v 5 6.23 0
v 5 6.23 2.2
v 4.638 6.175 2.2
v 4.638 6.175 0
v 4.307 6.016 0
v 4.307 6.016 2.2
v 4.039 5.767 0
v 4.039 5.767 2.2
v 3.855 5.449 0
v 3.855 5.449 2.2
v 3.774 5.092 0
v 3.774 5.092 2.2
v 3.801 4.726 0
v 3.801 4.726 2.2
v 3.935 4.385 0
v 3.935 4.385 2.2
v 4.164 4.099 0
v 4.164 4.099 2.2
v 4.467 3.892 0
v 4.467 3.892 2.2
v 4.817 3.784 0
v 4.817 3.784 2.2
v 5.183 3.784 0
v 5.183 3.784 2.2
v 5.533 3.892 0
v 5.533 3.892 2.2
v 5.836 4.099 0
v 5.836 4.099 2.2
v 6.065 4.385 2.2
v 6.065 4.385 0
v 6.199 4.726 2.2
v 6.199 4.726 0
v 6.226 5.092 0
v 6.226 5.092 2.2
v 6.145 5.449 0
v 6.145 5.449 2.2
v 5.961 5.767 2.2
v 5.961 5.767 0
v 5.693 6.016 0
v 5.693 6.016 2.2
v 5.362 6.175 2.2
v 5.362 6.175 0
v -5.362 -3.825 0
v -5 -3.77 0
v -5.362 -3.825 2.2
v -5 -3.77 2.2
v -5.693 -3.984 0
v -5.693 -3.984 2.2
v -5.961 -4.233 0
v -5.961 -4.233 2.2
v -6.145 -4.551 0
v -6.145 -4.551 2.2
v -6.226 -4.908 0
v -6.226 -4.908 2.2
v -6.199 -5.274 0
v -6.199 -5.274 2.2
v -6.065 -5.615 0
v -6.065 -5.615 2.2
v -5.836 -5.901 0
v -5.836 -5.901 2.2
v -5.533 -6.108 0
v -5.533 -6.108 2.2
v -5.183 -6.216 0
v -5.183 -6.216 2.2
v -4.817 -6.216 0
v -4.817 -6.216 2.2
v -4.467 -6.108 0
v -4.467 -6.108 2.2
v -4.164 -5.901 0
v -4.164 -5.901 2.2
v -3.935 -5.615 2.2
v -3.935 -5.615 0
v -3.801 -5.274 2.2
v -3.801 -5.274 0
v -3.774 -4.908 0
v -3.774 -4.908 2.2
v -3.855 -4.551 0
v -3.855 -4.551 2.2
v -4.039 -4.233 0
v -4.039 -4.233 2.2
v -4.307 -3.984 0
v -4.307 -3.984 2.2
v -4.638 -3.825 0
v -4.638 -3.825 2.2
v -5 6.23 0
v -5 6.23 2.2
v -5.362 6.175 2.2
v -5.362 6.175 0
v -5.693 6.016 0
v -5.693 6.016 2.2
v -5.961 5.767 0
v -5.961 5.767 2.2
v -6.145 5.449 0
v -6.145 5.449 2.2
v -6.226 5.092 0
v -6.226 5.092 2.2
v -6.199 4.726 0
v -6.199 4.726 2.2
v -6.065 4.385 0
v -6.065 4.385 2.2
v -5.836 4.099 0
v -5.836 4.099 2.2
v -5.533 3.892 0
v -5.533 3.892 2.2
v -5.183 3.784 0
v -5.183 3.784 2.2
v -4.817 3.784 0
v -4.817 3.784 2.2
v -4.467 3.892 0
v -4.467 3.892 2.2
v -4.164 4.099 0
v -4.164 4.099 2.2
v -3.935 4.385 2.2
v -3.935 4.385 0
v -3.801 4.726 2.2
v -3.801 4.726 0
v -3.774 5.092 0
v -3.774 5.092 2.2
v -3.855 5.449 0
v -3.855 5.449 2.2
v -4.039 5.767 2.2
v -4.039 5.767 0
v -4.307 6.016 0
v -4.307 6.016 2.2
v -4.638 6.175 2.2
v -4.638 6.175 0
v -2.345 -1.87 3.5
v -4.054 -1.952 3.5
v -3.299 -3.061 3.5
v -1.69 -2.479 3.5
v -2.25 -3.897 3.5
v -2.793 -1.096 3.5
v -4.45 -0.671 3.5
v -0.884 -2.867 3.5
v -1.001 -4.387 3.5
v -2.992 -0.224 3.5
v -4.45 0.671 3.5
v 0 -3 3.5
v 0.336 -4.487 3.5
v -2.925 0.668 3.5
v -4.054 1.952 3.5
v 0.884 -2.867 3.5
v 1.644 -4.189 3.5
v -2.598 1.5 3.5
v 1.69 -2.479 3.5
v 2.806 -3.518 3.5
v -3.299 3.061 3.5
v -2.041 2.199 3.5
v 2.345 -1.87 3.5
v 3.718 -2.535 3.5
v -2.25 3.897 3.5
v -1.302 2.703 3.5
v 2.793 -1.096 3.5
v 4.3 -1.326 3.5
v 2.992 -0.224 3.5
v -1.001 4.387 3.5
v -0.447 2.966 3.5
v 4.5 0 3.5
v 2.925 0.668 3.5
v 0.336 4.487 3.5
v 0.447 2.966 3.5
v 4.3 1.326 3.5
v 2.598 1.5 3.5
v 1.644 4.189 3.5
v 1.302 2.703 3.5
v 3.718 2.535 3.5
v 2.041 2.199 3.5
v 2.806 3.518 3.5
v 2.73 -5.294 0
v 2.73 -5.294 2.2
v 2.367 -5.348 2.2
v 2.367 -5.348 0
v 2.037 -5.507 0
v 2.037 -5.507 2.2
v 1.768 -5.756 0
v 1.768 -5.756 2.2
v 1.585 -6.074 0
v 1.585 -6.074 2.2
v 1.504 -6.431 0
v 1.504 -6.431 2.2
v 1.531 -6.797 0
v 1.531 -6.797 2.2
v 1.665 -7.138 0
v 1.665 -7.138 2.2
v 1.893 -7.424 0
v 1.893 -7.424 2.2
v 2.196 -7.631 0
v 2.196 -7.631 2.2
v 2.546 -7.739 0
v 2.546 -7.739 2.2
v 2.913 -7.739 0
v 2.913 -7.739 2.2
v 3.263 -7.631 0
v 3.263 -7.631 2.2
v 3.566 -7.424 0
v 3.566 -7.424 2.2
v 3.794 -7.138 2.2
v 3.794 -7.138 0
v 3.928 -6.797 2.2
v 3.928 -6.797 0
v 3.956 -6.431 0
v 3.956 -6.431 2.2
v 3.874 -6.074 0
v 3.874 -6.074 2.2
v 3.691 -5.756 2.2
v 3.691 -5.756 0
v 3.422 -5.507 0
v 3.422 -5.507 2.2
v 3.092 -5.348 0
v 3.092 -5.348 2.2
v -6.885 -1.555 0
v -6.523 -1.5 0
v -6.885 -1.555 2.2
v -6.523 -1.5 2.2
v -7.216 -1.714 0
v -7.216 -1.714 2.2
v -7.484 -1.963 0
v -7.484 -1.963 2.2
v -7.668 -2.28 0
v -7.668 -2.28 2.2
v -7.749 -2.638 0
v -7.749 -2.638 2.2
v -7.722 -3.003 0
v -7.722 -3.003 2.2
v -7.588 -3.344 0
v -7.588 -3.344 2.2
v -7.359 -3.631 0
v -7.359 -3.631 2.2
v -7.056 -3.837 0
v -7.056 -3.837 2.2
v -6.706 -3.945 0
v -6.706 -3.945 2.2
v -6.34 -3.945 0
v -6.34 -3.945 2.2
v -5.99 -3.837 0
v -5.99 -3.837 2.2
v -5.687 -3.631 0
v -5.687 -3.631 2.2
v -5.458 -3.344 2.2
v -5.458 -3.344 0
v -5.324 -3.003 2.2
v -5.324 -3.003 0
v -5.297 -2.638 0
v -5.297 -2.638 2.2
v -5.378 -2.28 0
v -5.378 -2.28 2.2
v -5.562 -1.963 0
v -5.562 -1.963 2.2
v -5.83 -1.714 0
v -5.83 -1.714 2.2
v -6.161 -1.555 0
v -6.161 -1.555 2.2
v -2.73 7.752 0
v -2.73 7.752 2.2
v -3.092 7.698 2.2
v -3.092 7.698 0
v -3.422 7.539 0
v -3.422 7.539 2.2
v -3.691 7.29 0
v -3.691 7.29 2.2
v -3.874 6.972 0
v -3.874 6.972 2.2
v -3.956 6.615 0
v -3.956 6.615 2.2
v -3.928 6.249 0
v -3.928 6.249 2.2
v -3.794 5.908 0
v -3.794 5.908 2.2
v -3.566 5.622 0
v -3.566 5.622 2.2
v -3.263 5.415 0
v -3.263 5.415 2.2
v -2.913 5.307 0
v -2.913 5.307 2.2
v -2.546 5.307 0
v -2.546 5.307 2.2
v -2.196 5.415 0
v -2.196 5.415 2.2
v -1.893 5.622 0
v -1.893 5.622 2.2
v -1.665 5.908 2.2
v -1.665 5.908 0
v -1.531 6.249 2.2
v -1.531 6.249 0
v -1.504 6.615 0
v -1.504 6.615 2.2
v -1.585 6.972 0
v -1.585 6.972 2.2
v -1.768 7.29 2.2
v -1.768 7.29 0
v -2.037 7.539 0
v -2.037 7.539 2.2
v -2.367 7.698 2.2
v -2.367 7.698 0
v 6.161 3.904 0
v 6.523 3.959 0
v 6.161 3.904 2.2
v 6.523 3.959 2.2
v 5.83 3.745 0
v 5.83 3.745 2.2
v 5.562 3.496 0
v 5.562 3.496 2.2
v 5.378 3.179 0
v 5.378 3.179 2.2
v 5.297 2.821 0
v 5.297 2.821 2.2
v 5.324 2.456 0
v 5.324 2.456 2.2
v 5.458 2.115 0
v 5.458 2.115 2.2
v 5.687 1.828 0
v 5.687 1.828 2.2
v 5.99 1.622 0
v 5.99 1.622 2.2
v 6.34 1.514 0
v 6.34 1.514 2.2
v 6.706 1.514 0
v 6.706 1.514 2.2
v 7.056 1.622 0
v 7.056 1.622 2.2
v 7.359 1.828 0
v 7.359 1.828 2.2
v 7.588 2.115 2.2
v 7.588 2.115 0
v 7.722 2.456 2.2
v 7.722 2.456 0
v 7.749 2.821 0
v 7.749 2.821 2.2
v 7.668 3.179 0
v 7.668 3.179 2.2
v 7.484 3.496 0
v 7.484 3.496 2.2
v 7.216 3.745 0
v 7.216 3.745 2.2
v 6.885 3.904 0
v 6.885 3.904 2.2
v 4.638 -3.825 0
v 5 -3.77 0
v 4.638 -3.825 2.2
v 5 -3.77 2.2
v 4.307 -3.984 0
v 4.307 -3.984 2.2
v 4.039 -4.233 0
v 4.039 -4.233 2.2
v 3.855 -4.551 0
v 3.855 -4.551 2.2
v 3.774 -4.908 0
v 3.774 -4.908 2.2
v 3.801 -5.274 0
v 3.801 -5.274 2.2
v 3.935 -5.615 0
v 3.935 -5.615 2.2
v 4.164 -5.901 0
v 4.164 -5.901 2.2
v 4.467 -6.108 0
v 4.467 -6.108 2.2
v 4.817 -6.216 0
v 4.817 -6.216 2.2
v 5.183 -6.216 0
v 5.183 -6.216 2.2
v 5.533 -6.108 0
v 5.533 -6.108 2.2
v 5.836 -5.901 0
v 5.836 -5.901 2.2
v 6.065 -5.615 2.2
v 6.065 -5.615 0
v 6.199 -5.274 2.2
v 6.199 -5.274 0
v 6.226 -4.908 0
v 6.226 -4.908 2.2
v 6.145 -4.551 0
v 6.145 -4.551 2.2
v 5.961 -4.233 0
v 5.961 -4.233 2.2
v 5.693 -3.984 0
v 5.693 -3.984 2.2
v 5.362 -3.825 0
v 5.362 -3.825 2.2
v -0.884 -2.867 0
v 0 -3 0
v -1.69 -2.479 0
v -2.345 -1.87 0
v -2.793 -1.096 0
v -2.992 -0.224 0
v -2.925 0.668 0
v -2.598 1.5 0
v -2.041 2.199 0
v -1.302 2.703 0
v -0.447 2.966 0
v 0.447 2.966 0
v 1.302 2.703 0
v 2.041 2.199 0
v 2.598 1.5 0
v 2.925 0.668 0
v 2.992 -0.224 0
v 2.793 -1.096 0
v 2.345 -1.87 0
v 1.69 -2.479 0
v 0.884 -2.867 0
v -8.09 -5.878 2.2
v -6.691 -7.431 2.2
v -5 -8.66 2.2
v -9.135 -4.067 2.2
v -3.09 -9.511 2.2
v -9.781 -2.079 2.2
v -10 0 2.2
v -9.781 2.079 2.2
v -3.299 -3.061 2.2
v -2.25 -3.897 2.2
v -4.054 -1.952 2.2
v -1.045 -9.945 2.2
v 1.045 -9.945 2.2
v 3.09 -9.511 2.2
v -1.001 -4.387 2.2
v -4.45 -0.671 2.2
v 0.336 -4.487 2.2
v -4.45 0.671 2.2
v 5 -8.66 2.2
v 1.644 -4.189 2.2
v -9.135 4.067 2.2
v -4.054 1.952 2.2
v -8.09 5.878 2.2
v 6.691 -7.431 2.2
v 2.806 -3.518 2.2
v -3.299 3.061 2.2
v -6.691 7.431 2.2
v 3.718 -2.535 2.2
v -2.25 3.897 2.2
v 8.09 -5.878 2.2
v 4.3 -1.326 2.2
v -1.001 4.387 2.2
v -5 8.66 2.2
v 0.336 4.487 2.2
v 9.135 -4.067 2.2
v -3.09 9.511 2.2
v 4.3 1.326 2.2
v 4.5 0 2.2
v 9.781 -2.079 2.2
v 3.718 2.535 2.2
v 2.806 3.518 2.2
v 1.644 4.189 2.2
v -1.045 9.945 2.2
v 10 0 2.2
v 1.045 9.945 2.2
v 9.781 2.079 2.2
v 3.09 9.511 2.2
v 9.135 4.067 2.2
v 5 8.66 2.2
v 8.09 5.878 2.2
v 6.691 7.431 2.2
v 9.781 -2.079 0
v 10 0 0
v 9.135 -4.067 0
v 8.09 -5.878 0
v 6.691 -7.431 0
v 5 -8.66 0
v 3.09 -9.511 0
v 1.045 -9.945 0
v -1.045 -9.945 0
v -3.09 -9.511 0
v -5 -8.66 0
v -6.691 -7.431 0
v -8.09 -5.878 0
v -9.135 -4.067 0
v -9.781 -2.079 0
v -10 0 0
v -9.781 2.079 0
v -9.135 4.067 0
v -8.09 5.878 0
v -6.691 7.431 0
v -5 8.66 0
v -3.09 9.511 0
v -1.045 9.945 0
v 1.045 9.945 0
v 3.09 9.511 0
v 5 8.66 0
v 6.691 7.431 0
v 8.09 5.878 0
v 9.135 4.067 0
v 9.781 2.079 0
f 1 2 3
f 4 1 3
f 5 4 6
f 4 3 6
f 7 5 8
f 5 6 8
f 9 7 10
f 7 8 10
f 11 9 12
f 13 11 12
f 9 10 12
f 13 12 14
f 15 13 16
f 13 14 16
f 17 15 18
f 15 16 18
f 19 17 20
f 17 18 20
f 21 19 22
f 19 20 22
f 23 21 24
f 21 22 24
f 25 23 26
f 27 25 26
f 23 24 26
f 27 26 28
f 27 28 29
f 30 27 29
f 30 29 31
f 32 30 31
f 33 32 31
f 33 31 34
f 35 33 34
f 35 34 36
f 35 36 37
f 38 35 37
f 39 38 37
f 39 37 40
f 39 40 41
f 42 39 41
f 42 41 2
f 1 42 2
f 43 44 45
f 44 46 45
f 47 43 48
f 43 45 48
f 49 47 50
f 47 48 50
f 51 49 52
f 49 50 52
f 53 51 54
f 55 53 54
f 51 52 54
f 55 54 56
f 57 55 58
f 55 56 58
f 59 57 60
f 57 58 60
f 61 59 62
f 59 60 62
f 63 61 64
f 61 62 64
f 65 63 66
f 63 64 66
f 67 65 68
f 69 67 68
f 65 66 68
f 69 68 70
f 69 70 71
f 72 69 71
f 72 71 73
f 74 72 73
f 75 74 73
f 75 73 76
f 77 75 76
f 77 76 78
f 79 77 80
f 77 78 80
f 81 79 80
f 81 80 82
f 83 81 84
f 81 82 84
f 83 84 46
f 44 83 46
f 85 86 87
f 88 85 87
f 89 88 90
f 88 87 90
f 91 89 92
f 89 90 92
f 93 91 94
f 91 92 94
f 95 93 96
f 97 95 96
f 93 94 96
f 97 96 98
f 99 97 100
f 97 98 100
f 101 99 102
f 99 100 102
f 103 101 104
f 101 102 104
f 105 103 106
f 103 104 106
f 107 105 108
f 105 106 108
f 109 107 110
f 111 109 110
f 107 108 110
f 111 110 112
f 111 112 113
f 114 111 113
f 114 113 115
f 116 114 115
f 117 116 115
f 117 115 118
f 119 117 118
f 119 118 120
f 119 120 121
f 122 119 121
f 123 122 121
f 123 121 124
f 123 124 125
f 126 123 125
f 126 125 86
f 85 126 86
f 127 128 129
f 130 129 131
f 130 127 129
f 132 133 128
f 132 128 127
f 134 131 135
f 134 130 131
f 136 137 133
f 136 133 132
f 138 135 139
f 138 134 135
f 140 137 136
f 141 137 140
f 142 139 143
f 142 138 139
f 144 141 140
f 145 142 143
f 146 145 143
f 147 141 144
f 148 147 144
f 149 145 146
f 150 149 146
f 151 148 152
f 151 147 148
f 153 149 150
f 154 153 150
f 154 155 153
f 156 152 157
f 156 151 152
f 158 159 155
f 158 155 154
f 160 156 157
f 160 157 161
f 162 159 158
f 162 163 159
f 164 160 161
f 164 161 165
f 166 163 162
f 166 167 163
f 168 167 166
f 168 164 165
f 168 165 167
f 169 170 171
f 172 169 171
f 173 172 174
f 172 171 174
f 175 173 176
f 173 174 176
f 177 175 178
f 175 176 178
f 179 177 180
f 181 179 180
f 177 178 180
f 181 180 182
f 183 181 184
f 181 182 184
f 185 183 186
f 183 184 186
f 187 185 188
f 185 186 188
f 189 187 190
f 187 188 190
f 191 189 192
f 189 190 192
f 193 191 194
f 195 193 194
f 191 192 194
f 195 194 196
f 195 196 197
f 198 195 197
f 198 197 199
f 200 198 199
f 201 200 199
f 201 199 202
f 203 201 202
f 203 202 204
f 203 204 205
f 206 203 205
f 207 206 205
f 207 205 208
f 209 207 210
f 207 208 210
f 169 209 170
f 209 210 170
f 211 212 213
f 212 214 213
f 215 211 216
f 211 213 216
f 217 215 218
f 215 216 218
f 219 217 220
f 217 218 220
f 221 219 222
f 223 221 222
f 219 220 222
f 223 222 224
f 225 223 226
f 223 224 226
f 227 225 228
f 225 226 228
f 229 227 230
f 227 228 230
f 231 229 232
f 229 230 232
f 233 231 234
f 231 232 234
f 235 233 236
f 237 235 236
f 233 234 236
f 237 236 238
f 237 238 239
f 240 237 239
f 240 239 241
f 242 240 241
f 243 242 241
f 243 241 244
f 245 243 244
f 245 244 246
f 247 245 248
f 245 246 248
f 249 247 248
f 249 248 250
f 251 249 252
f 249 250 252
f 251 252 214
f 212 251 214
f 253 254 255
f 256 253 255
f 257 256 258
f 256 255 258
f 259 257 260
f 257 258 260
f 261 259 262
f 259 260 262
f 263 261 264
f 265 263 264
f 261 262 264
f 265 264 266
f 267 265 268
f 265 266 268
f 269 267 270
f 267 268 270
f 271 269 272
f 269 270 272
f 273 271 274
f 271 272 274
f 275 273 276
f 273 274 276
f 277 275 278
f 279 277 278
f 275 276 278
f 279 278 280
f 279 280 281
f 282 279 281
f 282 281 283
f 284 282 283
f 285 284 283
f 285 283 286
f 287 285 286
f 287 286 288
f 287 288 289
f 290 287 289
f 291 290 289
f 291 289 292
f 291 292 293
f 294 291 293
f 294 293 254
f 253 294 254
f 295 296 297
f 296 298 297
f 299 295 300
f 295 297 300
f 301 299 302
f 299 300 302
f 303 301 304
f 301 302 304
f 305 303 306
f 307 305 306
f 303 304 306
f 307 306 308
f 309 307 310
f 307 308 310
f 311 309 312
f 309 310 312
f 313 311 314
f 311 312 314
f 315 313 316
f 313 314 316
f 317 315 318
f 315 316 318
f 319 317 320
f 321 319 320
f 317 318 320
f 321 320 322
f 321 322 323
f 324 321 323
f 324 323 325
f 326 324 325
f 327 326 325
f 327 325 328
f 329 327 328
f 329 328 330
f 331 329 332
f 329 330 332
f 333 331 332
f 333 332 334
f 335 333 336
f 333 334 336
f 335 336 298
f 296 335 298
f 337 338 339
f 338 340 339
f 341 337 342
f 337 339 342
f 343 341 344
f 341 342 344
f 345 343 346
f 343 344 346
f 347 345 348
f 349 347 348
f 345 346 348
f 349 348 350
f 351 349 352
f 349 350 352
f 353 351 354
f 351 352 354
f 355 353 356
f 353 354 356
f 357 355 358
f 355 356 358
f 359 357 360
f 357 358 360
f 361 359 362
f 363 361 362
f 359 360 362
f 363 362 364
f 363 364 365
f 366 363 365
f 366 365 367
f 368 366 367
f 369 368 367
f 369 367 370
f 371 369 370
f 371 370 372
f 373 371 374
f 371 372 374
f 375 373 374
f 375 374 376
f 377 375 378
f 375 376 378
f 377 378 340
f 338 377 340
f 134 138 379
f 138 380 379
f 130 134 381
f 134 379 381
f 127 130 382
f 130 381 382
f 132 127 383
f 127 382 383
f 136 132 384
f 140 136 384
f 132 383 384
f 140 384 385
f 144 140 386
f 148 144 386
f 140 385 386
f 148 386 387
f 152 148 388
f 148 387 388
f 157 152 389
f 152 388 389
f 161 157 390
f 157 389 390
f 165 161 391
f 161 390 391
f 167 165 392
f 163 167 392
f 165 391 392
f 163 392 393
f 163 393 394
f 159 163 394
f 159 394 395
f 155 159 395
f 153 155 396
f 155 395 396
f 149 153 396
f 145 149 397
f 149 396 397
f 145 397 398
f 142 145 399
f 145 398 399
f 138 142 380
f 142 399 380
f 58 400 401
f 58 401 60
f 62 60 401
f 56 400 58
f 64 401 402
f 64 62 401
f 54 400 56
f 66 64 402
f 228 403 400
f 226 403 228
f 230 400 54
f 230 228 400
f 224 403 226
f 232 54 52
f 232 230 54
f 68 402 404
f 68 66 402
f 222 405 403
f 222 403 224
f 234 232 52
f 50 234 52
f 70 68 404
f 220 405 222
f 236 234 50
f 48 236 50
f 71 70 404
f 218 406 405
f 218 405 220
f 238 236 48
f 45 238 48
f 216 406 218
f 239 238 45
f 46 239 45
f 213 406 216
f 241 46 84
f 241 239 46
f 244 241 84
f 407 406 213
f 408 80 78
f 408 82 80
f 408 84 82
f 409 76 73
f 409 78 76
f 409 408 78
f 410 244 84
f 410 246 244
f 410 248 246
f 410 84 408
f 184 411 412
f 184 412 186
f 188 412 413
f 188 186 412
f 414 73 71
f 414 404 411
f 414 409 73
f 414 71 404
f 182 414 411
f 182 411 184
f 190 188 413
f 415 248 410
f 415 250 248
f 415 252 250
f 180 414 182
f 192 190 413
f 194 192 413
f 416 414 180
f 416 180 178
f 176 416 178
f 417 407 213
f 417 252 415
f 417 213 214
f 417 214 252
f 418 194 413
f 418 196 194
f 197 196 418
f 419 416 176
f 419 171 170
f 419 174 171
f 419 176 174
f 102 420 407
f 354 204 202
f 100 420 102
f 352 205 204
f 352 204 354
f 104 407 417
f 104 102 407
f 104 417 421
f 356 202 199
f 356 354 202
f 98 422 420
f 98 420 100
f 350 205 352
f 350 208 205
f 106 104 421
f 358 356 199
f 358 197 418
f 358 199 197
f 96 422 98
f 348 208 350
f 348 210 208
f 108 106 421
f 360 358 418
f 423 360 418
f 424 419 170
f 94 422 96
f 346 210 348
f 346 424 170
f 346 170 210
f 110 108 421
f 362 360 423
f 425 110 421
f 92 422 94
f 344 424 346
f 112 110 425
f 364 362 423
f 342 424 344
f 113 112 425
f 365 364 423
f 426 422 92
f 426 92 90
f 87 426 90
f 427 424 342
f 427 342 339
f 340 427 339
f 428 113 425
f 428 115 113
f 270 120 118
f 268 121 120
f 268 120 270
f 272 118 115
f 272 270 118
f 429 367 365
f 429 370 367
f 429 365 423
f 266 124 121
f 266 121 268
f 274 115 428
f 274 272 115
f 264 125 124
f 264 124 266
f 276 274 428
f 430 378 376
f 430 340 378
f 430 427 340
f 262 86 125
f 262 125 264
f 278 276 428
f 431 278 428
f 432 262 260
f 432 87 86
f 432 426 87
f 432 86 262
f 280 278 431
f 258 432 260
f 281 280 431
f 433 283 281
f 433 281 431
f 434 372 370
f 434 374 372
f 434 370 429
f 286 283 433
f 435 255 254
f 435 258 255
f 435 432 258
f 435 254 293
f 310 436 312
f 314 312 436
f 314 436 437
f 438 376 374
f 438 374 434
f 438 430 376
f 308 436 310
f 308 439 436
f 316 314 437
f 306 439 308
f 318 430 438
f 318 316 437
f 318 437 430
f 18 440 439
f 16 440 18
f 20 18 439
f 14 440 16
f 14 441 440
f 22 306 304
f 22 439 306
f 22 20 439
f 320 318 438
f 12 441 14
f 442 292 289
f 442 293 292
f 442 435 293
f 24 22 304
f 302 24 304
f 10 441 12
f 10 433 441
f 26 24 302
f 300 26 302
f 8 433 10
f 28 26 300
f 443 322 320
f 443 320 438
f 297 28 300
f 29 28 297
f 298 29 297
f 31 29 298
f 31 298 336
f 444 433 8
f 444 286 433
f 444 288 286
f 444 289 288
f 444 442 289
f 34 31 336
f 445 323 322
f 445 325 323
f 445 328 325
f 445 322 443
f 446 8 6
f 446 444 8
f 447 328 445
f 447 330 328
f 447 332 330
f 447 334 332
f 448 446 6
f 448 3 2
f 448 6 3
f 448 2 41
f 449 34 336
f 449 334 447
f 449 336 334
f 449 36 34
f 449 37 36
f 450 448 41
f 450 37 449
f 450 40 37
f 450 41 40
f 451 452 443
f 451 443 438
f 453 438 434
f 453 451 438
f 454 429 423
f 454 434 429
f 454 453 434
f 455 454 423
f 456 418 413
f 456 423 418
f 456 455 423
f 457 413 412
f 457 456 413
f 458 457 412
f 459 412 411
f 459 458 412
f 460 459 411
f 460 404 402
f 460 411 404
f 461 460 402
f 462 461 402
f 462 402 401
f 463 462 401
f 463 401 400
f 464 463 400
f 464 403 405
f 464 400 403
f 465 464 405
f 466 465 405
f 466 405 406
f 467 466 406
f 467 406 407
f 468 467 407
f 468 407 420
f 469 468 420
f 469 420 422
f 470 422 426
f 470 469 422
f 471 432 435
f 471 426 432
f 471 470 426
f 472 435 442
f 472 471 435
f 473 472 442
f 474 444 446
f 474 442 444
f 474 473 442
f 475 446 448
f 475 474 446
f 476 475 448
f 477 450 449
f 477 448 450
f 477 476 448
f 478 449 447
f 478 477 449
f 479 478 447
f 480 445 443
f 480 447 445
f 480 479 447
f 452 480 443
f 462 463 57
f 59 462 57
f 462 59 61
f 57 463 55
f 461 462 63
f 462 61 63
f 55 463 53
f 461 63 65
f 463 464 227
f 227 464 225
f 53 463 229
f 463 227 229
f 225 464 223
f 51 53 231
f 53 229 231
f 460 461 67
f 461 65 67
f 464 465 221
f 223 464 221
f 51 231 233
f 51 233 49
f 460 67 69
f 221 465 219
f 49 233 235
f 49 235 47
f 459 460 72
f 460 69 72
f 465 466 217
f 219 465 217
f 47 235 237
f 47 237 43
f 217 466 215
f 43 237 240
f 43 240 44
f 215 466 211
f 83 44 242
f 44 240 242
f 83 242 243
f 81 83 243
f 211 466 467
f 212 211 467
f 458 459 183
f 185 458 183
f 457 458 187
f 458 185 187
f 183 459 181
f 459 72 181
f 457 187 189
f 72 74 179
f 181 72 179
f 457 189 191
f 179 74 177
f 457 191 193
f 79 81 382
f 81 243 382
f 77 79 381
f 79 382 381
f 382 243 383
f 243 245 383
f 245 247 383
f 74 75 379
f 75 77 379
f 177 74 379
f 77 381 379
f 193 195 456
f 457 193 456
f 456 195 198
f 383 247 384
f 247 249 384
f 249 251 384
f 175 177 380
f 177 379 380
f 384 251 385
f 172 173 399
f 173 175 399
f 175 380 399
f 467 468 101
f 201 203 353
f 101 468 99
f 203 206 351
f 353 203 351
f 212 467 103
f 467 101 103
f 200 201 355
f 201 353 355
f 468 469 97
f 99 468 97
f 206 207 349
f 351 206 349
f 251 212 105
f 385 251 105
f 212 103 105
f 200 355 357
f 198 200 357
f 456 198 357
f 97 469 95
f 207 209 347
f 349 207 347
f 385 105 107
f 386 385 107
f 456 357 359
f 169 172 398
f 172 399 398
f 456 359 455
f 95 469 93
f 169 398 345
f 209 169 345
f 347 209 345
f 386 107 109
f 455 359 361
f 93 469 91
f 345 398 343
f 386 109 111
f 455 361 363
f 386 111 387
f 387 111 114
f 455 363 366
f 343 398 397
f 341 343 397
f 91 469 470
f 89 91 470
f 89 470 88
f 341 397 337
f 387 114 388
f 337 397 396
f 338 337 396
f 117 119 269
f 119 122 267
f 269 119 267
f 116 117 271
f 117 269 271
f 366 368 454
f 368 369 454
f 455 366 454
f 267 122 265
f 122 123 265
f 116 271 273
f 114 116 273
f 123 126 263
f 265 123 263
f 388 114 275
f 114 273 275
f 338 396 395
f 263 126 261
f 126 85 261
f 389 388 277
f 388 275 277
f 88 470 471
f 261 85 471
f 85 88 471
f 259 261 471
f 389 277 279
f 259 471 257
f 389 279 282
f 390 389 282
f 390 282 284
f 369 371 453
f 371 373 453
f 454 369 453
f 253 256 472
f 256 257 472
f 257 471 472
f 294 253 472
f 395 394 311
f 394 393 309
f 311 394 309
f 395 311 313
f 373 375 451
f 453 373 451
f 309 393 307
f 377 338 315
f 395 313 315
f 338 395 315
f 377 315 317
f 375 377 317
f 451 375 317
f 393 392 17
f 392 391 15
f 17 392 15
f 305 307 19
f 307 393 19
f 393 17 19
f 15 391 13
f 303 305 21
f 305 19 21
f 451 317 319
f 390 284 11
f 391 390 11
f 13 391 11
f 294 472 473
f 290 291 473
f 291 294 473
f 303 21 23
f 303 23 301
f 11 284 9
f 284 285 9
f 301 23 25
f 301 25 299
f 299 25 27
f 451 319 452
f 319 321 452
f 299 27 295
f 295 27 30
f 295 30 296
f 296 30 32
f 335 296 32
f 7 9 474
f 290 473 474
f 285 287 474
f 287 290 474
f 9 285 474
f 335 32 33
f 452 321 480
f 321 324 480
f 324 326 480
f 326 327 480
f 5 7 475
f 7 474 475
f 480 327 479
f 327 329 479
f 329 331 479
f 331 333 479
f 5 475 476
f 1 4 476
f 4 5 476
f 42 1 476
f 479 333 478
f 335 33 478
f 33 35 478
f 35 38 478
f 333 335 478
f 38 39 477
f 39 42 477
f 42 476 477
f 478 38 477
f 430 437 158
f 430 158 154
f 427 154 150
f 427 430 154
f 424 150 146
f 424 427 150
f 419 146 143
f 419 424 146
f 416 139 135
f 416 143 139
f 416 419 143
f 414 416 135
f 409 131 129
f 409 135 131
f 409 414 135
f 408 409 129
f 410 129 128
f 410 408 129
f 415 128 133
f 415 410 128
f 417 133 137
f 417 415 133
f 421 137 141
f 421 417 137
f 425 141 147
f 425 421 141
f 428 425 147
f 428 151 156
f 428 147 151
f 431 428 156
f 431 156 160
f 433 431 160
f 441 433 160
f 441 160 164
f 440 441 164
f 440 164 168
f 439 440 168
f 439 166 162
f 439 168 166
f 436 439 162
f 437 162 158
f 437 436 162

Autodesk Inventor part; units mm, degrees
ref_plane "YZ Plane" through (0, 0, 0) normal (1, 0, 0) x (0, 1, 0)
ref_plane "XZ Plane" through (0, 0, 0) normal (0, 1, 0) x (-1, 0, 0)
ref_plane "XY Plane" through (0, 0, 0) normal (0, 0, 1) x (1, 0, 0)
sketch "スケッチ1" plane through (0, 0, 0) normal (0, 0, 1) x (1, 0, 0)
  circle A0 centre (0, 0) radius 10
  dimension "d0" = 20
extrude "押し出し1" add sketch "スケッチ1" along normal blind 2.2
sketch "スケッチ2" plane through (0, 0, 2.2) normal (0, 0, 1) x (1, 0, 0)
  circle A0 centre (0, 0) radius 4.5
  dimension "d3" = 9
extrude "押し出し2" add sketch "スケッチ2" along normal blind 1.3
sketch "スケッチ3" plane through (0, 0, 0) normal (0, 0, -1) x (-1, 0, 0)
  circle A0 centre (0, 0) radius 10 projected
  line L0 (0, 10) -> (0, -10)
  line L1 (-10, 0) -> (10, 0)
  point P0 (-5, 5)
  point P1 (5, 5)
  point P2 (5, -5)
  point P3 (-5, -5)
  dimension "d6" = 10
  dimension "d7" = 10
hole "穴1" at (5, 5, 0) at (-5, 5, 0) at (-5, -5, 0) at (5, -5, 0) direction (0, 0, 1) diameter 2.459 end through all thread size "M3x0.5" class "6H" standard "ISO Metric profile"
sketch "スケッチ4" plane through (0, 0, 3.5) normal (0, 0, -1) x (-1, 0, 0)
  point P0 (0, 0)
  point P1 (0, 0)
hole "穴2" at (0, 0, 3.5) direction (0, 0, -1) diameter 6 end through all
sketch "スケッチ5" plane through (0, 0, 0) normal (0, 0, -1) x (-1, 0, 0)
  point P0 (-2.7296, -6.523)
  point P1 (2.7296, 6.523)
  point P2 (-6.523, 2.7296)
  point P3 (6.523, -2.7296)
hole "穴3" at (2.7296, -6.523, 0) at (-2.7296, 6.523, 0) at (6.523, 2.7296, 0) at (-6.523, -2.7296, 0) direction (0, 0, 1) diameter 2.459 depth 7 tip angle 120 thread size "M3x0.5" class "6H" standard "ISO Metric profile"
properties part number "サーボモータ25kgcmサーボホーン1" material "アルミニウム 6061"
